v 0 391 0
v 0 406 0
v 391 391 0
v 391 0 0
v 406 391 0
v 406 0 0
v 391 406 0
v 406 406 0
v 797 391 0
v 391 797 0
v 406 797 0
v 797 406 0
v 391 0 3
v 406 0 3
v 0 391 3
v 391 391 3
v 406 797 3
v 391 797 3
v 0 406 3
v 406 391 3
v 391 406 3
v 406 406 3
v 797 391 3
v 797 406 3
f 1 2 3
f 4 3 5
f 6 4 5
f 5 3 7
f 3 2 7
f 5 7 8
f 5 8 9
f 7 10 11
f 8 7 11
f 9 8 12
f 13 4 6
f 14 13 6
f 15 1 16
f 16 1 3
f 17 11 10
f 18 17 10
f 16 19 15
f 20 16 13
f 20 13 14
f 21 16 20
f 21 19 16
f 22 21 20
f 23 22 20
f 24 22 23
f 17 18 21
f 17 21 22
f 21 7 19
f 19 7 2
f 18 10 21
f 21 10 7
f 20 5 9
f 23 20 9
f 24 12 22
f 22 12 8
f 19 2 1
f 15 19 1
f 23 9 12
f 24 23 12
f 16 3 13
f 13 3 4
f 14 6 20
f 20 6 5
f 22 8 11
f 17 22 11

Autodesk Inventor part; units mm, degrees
ref_plane "YZ Plane" through (0, 0, 0) normal (1, 0, 0) x (0, 1, 0)
ref_plane "XZ Plane" through (0, 0, 0) normal (0, 1, 0) x (-1, 0, 0)
ref_plane "XY Plane" through (0, 0, 0) normal (0, 0, 1) x (1, 0, 0)
ref_plane "Płaszczyzna konstrukcyjna1" through (0, 0, 0) normal (0, 0, 1) x (1, 0, 0)
sketch "Szkic1" plane through (0, 0, 0) normal (0, 0, 1) x (1, 0, 0)
  circle A0 centre (836, 698.5) radius 4 projected
  circle A1 centre (836, 98.5) radius 4 projected
  circle A2 centre (698.5, -39) radius 4 projected
  circle A3 centre (98.5, -39) radius 4 projected
  circle A4 centre (-39, 98.5) radius 4 projected
  circle A5 centre (-39, 698.5) radius 4 projected
  circle A6 centre (836, 398.5) radius 4 projected
  circle A7 centre (398.5, -39) radius 4 projected
  circle A8 centre (-39, 398.5) radius 4 projected
  circle A9 centre (98.5, 836) radius 4 projected
  circle A10 centre (698.5, 836) radius 4 projected
  circle A11 centre (398.5, 836) radius 4 projected
  line L0 (0, 797) -> (0, 0) projected
  line L1 (0, 0) -> (797, 0) projected
  line L2 (797, 0) -> (797, 797) projected
  line L3 (797, 797) -> (0, 797) projected
  line L4 (856, 856) -> (856, -59) projected
  line L5 (856, -59) -> (-59, -59) projected
  line L6 (-59, -59) -> (-59, 856) projected
  line L7 (-59, 856) -> (856, 856) projected
  line L8 (406, 797) -> (391, 797)
  line L9 (391, 797) -> (391, 0)
  line L10 (391, 0) -> (406, 0)
  line L11 (406, 0) -> (406, 797)
  line L12 (406, 797) -> (391, 0) construction
  line L13 (391, 797) -> (406, 0) construction
  line L14 (797, 406) -> (0, 406)
  line L15 (0, 406) -> (0, 391)
  line L16 (0, 391) -> (797, 391)
  line L17 (797, 391) -> (797, 406)
  line L18 (797, 406) -> (0, 391) construction
  line L19 (0, 406) -> (797, 391) construction
  circle A12 centre (761, -24) radius 3 projected
  circle A13 centre (348.5, -24) radius 3 projected
  circle A14 centre (-24, -24) radius 3 projected
  circle A15 centre (-24, 348.5) radius 3 projected
  circle A16 centre (-24, 761) radius 3 projected
  circle A17 centre (248.5, 821) radius 3 projected
  circle A18 centre (648.5, 821) radius 3 projected
  circle A19 centre (821, 648.5) radius 3 projected
  circle A20 centre (821, 248.5) radius 3 projected
  circle A21 centre (821, 348.5) radius 3 projected
  circle A22 centre (821, 761) radius 3 projected
  circle A23 centre (548.5, 821) radius 3 projected
  circle A24 centre (148.5, 821) radius 3 projected
  circle A25 centre (-24, 648.5) radius 3 projected
  circle A26 centre (-24, 248.5) radius 3 projected
  circle A27 centre (36, -24) radius 3 projected
  circle A28 centre (448.5, -24) radius 3 projected
  circle A29 centre (821, -24) radius 3 projected
  circle A30 centre (648.5, -24) radius 3 projected
  circle A31 centre (248.5, -24) radius 3 projected
  circle A32 centre (-24, 36) radius 3 projected
  circle A33 centre (-24, 448.5) radius 3 projected
  circle A34 centre (-24, 821) radius 3 projected
  circle A35 centre (348.5, 821) radius 3 projected
  circle A36 centre (761, 821) radius 3 projected
  circle A37 centre (821, 548.5) radius 3 projected
  circle A38 centre (821, 148.5) radius 3 projected
  circle A39 centre (821, 448.5) radius 3 projected
  circle A40 centre (821, 821) radius 3 projected
  circle A41 centre (448.5, 821) radius 3 projected
  circle A42 centre (36, 821) radius 3 projected
  circle A43 centre (-24, 548.5) radius 3 projected
  circle A44 centre (-24, 148.5) radius 3 projected
  circle A45 centre (148.5, -24) radius 3 projected
  circle A46 centre (548.5, -24) radius 3 projected
  circle A47 centre (821, 36) radius 3 projected
  point P0 (398.5, 398.5)
  point P1 (391, 391)
  point P2 (406, 391)
  point P3 (797, 391)
  point P4 (797, 406)
  point P5 (406, 406)
  point P6 (391, 406)
  point P7 (0, 406)
  dimension "d6" = 15
  dimension "d7" = 797
  dimension "d8" = 15
extrude "Wyciągnięcie proste1" add sketch "Szkic1" along normal blind 3 contours L14 L9 L16 L0 | L3 L11 L14 L9 | L14 L11 L16 L9 | L16 L11 L1 L9 | L14 L2 L16 L11
properties part number "krys" material "Aluminium"
